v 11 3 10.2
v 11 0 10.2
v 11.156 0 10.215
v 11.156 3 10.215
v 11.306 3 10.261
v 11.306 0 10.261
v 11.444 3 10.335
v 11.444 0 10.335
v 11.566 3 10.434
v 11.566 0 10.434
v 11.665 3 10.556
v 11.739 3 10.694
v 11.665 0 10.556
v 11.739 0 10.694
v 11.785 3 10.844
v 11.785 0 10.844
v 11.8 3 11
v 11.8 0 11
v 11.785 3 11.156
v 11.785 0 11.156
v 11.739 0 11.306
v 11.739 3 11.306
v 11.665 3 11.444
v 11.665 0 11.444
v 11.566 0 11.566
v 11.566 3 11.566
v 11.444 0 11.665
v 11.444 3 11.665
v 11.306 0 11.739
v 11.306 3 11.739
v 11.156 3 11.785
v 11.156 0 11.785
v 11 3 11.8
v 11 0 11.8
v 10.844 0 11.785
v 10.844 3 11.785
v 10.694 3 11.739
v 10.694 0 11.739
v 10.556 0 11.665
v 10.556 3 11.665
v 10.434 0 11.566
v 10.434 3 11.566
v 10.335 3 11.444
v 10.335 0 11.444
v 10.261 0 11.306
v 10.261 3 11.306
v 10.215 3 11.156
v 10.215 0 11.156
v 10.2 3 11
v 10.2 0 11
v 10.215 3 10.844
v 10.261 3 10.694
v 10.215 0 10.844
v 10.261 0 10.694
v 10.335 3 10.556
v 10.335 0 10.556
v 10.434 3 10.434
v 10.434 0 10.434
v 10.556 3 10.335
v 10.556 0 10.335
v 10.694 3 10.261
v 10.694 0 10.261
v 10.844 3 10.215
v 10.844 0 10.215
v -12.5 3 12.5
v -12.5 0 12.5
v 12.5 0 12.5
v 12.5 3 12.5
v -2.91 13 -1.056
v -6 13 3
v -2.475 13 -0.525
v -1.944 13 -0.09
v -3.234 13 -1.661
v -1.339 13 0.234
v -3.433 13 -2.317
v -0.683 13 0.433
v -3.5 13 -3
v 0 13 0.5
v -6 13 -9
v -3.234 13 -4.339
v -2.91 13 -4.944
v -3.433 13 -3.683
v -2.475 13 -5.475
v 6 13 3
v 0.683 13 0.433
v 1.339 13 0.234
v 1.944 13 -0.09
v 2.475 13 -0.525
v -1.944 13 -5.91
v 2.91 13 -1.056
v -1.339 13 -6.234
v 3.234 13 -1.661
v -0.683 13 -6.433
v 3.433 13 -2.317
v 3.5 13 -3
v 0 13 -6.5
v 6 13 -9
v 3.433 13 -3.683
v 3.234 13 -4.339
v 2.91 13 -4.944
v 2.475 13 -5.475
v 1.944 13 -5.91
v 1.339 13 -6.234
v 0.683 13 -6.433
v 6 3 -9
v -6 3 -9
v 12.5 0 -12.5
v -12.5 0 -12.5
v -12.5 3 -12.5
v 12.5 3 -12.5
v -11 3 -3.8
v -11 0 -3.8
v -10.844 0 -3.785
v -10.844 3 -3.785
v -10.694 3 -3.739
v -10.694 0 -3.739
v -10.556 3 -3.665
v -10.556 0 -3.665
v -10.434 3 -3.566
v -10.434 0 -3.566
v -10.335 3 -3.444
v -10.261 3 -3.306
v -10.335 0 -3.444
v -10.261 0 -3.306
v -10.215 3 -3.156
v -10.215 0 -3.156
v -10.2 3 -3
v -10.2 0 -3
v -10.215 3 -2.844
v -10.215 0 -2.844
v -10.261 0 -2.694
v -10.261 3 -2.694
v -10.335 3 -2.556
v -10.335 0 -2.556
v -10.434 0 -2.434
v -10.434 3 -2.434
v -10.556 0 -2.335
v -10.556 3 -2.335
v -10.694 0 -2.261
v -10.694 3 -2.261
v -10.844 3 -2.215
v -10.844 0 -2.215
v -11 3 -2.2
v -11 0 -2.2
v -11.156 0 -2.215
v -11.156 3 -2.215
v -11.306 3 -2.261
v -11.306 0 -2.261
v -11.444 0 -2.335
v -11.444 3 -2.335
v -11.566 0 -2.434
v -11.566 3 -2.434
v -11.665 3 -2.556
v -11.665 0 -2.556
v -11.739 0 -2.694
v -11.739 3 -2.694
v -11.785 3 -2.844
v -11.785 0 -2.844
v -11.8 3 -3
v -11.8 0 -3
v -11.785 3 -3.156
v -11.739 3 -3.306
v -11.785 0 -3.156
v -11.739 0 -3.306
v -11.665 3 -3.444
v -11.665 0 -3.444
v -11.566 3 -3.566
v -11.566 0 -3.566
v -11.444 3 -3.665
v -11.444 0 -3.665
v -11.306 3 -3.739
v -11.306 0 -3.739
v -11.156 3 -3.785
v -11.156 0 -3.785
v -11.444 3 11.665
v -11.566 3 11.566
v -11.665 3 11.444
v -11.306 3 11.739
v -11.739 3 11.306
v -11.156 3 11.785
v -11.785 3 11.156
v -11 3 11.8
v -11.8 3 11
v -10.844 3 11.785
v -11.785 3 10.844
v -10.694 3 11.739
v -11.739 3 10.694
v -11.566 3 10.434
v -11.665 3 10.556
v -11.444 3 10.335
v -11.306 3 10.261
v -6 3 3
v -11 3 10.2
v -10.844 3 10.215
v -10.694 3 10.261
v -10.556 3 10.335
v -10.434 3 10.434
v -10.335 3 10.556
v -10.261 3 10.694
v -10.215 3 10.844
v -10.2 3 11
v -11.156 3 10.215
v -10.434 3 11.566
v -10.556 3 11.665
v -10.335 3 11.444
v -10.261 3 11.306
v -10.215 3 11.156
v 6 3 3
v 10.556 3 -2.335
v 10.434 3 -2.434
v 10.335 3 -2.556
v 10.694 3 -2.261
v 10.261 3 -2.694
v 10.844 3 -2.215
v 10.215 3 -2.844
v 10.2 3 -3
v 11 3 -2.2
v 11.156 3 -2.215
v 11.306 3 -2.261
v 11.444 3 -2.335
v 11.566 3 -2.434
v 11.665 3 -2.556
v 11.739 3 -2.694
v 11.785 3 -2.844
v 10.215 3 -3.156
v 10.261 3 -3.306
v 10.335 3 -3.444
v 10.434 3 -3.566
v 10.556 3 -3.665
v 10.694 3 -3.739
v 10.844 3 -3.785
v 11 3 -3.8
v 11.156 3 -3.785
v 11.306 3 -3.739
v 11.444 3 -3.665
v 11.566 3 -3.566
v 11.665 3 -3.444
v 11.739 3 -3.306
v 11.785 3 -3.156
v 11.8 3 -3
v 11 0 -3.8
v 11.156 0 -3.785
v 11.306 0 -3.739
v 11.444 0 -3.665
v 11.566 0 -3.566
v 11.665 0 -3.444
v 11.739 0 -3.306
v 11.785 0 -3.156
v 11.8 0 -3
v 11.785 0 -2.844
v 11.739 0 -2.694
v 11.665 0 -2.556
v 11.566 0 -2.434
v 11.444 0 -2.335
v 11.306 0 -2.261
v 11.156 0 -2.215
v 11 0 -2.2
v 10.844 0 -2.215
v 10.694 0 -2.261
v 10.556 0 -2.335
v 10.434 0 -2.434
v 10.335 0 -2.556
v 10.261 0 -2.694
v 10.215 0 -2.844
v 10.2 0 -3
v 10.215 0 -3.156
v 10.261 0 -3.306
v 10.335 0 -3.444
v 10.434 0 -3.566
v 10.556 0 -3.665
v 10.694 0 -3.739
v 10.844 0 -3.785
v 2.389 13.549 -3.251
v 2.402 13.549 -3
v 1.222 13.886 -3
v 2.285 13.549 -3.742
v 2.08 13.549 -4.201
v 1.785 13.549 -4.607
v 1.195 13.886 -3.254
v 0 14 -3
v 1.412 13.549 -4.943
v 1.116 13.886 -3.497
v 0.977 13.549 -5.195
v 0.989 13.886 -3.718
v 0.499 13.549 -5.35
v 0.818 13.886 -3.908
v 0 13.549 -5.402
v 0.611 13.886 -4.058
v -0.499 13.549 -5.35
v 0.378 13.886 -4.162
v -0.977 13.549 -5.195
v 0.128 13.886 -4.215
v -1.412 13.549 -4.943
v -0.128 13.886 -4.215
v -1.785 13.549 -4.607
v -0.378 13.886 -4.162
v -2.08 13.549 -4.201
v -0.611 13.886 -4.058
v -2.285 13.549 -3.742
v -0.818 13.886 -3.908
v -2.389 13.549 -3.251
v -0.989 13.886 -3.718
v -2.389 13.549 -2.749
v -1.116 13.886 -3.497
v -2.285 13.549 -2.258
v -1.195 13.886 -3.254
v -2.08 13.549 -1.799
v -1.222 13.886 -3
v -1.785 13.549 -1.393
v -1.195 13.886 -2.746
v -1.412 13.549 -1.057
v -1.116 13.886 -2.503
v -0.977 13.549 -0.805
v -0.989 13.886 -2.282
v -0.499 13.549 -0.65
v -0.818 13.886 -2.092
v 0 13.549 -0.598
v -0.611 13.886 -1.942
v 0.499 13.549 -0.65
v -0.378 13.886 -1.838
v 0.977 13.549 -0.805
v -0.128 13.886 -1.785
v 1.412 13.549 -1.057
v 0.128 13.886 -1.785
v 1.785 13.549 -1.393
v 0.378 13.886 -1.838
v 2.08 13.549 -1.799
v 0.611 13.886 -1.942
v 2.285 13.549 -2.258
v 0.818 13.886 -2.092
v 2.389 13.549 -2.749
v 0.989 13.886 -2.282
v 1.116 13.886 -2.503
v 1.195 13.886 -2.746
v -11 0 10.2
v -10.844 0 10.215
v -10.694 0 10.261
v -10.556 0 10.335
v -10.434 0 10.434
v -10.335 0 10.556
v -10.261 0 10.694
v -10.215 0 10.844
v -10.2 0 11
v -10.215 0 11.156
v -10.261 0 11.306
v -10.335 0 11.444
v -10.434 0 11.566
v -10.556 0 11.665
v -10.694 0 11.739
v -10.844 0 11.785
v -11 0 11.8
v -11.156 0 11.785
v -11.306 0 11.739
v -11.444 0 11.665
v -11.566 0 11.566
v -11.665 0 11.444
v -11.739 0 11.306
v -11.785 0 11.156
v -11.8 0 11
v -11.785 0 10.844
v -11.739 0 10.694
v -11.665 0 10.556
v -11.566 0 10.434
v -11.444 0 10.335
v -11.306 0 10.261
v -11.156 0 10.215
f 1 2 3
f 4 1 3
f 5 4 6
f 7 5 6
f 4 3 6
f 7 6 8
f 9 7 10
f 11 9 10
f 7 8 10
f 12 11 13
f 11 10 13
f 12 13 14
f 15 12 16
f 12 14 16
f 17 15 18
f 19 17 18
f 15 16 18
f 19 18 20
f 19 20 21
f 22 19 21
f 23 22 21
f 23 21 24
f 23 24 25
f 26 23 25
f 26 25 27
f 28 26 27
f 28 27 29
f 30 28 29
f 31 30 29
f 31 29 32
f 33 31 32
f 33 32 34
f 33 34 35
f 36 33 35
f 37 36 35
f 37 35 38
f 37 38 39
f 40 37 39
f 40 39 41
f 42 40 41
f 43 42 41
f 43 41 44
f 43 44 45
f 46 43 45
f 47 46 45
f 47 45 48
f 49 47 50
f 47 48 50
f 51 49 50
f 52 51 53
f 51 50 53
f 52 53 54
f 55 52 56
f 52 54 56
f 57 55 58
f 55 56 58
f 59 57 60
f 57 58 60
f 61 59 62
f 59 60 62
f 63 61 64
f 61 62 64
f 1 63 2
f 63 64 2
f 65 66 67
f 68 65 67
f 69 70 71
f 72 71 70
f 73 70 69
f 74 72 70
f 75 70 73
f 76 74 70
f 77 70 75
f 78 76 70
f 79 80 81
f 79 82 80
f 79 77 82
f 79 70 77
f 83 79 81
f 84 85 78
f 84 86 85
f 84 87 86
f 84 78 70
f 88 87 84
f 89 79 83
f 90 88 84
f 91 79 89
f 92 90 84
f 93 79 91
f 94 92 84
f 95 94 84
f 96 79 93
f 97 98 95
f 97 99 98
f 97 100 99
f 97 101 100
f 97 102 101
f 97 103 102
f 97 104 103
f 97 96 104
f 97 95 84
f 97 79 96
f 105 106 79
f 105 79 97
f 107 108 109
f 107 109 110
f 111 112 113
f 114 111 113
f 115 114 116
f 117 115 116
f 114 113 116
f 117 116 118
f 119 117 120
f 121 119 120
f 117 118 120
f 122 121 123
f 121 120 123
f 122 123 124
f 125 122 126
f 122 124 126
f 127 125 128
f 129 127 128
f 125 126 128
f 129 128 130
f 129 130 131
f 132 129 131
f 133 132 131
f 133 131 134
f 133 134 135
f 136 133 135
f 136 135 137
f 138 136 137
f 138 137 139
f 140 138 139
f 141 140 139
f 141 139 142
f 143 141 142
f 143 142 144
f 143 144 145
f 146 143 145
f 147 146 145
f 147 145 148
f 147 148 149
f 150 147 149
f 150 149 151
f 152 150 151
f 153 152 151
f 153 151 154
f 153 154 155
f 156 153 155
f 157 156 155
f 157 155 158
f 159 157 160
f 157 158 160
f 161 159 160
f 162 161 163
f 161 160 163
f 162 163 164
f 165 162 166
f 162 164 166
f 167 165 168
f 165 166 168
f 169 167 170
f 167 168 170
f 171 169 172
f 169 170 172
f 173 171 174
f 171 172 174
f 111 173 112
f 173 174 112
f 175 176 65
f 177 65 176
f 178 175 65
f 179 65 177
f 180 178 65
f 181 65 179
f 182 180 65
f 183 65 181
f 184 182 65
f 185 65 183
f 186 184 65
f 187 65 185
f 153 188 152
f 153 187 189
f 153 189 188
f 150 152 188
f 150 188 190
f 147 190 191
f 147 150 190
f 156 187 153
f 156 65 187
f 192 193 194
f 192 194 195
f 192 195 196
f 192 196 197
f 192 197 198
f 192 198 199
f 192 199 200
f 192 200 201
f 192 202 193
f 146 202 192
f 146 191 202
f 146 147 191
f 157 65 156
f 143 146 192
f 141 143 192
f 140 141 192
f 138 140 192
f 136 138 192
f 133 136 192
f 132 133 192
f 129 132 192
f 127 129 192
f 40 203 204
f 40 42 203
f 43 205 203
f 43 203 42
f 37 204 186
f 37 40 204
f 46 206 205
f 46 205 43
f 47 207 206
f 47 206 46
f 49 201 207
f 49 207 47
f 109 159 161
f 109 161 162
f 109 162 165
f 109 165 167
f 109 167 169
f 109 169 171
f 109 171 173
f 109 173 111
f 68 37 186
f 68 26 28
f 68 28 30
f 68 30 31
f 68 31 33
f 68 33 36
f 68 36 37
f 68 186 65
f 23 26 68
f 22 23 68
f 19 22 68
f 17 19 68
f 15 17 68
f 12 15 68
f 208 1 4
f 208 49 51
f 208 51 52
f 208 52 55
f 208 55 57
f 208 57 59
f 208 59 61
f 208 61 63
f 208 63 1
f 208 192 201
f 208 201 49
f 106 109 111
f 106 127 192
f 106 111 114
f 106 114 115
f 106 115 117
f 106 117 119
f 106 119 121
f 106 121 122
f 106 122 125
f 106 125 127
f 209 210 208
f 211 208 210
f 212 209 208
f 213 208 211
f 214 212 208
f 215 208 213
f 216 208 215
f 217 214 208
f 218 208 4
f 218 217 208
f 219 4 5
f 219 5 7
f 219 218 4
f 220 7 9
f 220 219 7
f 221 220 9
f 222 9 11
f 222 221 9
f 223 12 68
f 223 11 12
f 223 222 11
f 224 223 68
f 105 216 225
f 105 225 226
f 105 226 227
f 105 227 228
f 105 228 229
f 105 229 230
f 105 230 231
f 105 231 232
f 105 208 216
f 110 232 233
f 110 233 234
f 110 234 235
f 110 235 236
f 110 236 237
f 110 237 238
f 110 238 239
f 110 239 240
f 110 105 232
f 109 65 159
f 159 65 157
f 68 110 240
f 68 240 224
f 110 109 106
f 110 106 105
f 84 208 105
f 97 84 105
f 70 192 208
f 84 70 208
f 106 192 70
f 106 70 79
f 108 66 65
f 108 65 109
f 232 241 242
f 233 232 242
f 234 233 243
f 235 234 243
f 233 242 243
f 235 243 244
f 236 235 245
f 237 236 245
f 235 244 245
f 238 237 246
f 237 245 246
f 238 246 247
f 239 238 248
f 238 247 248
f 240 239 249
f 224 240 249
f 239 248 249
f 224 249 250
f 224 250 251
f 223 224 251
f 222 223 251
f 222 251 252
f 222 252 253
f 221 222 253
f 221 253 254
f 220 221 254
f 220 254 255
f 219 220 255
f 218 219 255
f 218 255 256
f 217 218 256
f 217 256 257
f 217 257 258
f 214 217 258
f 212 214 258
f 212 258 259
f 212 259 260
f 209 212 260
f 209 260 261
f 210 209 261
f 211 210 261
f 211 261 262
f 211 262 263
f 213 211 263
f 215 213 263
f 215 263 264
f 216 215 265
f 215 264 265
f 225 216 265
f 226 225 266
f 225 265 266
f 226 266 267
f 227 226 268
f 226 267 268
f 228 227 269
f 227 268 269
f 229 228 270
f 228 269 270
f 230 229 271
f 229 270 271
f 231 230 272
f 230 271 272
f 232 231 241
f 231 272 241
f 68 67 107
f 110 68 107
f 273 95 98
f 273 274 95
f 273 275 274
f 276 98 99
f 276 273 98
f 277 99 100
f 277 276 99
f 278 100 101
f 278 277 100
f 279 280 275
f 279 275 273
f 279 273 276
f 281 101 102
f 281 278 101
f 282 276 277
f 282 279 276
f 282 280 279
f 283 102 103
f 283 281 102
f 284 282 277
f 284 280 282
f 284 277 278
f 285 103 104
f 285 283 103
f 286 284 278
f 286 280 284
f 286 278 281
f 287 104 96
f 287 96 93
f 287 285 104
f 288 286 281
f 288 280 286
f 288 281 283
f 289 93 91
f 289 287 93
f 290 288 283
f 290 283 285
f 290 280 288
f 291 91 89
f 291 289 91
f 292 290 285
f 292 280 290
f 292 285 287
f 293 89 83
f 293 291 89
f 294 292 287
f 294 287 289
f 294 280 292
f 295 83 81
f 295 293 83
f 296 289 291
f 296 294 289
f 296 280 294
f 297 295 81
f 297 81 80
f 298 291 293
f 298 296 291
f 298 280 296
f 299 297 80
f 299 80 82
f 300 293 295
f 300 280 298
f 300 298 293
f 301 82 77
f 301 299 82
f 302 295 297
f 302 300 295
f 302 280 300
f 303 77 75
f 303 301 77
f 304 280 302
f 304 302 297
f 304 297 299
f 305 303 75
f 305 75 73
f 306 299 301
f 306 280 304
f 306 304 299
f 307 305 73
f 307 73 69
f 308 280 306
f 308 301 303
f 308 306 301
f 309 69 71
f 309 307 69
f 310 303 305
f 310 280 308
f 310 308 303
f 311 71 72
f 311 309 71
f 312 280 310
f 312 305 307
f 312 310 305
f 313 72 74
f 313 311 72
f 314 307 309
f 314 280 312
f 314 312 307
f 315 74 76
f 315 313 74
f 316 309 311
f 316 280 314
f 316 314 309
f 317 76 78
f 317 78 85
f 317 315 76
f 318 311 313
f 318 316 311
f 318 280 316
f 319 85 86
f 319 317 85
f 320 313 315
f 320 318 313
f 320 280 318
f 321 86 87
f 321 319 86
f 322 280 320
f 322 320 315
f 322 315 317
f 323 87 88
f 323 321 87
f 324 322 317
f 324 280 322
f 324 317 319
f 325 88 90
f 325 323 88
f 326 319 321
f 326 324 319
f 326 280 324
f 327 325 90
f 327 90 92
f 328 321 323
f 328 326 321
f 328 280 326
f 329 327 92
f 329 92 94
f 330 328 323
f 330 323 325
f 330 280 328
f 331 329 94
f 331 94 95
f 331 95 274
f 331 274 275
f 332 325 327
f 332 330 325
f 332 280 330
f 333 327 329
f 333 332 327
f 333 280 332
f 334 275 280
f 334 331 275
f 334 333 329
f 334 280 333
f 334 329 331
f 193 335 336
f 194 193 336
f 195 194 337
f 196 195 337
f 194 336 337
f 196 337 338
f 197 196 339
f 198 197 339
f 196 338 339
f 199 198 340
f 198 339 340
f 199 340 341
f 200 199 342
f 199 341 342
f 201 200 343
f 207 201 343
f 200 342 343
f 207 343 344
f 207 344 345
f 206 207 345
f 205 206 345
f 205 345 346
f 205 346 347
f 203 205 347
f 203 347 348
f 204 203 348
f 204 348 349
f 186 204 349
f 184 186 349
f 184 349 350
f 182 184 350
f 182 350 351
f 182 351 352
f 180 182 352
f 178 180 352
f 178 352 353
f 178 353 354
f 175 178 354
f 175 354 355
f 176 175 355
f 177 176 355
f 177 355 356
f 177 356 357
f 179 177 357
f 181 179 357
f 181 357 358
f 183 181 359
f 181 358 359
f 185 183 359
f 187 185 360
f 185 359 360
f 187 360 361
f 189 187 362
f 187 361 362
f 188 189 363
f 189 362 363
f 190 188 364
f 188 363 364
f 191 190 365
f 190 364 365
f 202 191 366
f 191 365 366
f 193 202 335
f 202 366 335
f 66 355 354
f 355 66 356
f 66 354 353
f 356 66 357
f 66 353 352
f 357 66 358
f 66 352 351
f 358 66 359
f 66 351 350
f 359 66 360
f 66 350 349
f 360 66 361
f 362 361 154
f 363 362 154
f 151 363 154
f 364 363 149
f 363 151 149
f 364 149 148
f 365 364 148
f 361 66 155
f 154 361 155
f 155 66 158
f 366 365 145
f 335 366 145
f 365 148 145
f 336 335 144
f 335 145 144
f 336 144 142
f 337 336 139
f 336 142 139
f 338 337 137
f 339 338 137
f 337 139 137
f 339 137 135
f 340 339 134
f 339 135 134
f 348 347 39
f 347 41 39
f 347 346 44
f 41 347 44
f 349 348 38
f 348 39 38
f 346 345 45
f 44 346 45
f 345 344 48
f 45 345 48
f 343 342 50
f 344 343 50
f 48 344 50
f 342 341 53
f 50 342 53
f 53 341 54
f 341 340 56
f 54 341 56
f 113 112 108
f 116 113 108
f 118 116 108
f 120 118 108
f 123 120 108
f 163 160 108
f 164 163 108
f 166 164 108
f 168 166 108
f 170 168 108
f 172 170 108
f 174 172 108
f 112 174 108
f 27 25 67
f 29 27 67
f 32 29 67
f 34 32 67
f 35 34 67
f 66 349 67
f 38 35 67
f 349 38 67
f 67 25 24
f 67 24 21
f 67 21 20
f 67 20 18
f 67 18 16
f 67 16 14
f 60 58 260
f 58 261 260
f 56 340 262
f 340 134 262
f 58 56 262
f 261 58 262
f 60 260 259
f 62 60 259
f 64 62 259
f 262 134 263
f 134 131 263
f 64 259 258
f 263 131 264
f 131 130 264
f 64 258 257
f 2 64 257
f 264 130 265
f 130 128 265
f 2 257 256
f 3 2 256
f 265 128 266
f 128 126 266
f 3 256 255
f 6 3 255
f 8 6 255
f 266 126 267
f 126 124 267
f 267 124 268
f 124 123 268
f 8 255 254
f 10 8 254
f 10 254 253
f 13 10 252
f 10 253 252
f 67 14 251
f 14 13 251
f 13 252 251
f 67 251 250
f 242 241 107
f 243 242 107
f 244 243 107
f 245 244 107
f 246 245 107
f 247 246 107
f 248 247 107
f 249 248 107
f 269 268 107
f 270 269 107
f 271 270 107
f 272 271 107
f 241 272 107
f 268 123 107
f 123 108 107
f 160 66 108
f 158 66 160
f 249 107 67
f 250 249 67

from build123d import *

# Parameters (mm, degrees)
SKETCH1_W             = 25
SKETCH1_H             = 25
BASE_PLATE_DEPTH      = 3
M2X0_4_TAPPED_HOLE1_D = 1.6
SKETCH6_W             = 12
SKETCH6_H             = 12
LENSE_BASE_DEPTH      = 10


# Read off the part's stored shape, not the designer's step: lense
with BuildPart() as part:
    # Sketch1 → base_plate (new body)
    with BuildSketch(Plane(origin=(0, 0, 0), x_dir=(1, 0, 0), z_dir=(0, 1, 0))):
        Rectangle(SKETCH1_W, SKETCH1_H)
    extrude(amount=BASE_PLATE_DEPTH)

    # M2x0.4 Tapped Hole1 (through all)
    with Locations(Plane(origin=(-11, 3, -3), x_dir=(0, 0, 1), z_dir=(0, 1, 0))):
        with Locations((0, 0), (14, 0), (14, 22), (0, 22)):
            Hole(M2X0_4_TAPPED_HOLE1_D / 2)

    # Sketch6 → lense_base (add)
    with BuildSketch(Plane(origin=(0, 3, 0), x_dir=(1, 0, 0), z_dir=(0, 1, 0))):
        with Locations((0, 3)):
            Rectangle(SKETCH6_W, SKETCH6_H)
    extrude(amount=LENSE_BASE_DEPTH)

    # lense outline → lense (revolve)
    with BuildSketch(Plane.XY.offset(-3)):
        with BuildLine():
            Line((0, 12.999999997), (3.500000006, 12.999999997))
            ThreePointArc((3.500000006, 12.999999997), (1.820027476, 13.745096152), (0, 14))
            Line((0, 14), (0, 12.999999997))
        make_face()
    revolve(axis=Axis((0, 0, -3), (0, 1, 0)))


solid = part.part
